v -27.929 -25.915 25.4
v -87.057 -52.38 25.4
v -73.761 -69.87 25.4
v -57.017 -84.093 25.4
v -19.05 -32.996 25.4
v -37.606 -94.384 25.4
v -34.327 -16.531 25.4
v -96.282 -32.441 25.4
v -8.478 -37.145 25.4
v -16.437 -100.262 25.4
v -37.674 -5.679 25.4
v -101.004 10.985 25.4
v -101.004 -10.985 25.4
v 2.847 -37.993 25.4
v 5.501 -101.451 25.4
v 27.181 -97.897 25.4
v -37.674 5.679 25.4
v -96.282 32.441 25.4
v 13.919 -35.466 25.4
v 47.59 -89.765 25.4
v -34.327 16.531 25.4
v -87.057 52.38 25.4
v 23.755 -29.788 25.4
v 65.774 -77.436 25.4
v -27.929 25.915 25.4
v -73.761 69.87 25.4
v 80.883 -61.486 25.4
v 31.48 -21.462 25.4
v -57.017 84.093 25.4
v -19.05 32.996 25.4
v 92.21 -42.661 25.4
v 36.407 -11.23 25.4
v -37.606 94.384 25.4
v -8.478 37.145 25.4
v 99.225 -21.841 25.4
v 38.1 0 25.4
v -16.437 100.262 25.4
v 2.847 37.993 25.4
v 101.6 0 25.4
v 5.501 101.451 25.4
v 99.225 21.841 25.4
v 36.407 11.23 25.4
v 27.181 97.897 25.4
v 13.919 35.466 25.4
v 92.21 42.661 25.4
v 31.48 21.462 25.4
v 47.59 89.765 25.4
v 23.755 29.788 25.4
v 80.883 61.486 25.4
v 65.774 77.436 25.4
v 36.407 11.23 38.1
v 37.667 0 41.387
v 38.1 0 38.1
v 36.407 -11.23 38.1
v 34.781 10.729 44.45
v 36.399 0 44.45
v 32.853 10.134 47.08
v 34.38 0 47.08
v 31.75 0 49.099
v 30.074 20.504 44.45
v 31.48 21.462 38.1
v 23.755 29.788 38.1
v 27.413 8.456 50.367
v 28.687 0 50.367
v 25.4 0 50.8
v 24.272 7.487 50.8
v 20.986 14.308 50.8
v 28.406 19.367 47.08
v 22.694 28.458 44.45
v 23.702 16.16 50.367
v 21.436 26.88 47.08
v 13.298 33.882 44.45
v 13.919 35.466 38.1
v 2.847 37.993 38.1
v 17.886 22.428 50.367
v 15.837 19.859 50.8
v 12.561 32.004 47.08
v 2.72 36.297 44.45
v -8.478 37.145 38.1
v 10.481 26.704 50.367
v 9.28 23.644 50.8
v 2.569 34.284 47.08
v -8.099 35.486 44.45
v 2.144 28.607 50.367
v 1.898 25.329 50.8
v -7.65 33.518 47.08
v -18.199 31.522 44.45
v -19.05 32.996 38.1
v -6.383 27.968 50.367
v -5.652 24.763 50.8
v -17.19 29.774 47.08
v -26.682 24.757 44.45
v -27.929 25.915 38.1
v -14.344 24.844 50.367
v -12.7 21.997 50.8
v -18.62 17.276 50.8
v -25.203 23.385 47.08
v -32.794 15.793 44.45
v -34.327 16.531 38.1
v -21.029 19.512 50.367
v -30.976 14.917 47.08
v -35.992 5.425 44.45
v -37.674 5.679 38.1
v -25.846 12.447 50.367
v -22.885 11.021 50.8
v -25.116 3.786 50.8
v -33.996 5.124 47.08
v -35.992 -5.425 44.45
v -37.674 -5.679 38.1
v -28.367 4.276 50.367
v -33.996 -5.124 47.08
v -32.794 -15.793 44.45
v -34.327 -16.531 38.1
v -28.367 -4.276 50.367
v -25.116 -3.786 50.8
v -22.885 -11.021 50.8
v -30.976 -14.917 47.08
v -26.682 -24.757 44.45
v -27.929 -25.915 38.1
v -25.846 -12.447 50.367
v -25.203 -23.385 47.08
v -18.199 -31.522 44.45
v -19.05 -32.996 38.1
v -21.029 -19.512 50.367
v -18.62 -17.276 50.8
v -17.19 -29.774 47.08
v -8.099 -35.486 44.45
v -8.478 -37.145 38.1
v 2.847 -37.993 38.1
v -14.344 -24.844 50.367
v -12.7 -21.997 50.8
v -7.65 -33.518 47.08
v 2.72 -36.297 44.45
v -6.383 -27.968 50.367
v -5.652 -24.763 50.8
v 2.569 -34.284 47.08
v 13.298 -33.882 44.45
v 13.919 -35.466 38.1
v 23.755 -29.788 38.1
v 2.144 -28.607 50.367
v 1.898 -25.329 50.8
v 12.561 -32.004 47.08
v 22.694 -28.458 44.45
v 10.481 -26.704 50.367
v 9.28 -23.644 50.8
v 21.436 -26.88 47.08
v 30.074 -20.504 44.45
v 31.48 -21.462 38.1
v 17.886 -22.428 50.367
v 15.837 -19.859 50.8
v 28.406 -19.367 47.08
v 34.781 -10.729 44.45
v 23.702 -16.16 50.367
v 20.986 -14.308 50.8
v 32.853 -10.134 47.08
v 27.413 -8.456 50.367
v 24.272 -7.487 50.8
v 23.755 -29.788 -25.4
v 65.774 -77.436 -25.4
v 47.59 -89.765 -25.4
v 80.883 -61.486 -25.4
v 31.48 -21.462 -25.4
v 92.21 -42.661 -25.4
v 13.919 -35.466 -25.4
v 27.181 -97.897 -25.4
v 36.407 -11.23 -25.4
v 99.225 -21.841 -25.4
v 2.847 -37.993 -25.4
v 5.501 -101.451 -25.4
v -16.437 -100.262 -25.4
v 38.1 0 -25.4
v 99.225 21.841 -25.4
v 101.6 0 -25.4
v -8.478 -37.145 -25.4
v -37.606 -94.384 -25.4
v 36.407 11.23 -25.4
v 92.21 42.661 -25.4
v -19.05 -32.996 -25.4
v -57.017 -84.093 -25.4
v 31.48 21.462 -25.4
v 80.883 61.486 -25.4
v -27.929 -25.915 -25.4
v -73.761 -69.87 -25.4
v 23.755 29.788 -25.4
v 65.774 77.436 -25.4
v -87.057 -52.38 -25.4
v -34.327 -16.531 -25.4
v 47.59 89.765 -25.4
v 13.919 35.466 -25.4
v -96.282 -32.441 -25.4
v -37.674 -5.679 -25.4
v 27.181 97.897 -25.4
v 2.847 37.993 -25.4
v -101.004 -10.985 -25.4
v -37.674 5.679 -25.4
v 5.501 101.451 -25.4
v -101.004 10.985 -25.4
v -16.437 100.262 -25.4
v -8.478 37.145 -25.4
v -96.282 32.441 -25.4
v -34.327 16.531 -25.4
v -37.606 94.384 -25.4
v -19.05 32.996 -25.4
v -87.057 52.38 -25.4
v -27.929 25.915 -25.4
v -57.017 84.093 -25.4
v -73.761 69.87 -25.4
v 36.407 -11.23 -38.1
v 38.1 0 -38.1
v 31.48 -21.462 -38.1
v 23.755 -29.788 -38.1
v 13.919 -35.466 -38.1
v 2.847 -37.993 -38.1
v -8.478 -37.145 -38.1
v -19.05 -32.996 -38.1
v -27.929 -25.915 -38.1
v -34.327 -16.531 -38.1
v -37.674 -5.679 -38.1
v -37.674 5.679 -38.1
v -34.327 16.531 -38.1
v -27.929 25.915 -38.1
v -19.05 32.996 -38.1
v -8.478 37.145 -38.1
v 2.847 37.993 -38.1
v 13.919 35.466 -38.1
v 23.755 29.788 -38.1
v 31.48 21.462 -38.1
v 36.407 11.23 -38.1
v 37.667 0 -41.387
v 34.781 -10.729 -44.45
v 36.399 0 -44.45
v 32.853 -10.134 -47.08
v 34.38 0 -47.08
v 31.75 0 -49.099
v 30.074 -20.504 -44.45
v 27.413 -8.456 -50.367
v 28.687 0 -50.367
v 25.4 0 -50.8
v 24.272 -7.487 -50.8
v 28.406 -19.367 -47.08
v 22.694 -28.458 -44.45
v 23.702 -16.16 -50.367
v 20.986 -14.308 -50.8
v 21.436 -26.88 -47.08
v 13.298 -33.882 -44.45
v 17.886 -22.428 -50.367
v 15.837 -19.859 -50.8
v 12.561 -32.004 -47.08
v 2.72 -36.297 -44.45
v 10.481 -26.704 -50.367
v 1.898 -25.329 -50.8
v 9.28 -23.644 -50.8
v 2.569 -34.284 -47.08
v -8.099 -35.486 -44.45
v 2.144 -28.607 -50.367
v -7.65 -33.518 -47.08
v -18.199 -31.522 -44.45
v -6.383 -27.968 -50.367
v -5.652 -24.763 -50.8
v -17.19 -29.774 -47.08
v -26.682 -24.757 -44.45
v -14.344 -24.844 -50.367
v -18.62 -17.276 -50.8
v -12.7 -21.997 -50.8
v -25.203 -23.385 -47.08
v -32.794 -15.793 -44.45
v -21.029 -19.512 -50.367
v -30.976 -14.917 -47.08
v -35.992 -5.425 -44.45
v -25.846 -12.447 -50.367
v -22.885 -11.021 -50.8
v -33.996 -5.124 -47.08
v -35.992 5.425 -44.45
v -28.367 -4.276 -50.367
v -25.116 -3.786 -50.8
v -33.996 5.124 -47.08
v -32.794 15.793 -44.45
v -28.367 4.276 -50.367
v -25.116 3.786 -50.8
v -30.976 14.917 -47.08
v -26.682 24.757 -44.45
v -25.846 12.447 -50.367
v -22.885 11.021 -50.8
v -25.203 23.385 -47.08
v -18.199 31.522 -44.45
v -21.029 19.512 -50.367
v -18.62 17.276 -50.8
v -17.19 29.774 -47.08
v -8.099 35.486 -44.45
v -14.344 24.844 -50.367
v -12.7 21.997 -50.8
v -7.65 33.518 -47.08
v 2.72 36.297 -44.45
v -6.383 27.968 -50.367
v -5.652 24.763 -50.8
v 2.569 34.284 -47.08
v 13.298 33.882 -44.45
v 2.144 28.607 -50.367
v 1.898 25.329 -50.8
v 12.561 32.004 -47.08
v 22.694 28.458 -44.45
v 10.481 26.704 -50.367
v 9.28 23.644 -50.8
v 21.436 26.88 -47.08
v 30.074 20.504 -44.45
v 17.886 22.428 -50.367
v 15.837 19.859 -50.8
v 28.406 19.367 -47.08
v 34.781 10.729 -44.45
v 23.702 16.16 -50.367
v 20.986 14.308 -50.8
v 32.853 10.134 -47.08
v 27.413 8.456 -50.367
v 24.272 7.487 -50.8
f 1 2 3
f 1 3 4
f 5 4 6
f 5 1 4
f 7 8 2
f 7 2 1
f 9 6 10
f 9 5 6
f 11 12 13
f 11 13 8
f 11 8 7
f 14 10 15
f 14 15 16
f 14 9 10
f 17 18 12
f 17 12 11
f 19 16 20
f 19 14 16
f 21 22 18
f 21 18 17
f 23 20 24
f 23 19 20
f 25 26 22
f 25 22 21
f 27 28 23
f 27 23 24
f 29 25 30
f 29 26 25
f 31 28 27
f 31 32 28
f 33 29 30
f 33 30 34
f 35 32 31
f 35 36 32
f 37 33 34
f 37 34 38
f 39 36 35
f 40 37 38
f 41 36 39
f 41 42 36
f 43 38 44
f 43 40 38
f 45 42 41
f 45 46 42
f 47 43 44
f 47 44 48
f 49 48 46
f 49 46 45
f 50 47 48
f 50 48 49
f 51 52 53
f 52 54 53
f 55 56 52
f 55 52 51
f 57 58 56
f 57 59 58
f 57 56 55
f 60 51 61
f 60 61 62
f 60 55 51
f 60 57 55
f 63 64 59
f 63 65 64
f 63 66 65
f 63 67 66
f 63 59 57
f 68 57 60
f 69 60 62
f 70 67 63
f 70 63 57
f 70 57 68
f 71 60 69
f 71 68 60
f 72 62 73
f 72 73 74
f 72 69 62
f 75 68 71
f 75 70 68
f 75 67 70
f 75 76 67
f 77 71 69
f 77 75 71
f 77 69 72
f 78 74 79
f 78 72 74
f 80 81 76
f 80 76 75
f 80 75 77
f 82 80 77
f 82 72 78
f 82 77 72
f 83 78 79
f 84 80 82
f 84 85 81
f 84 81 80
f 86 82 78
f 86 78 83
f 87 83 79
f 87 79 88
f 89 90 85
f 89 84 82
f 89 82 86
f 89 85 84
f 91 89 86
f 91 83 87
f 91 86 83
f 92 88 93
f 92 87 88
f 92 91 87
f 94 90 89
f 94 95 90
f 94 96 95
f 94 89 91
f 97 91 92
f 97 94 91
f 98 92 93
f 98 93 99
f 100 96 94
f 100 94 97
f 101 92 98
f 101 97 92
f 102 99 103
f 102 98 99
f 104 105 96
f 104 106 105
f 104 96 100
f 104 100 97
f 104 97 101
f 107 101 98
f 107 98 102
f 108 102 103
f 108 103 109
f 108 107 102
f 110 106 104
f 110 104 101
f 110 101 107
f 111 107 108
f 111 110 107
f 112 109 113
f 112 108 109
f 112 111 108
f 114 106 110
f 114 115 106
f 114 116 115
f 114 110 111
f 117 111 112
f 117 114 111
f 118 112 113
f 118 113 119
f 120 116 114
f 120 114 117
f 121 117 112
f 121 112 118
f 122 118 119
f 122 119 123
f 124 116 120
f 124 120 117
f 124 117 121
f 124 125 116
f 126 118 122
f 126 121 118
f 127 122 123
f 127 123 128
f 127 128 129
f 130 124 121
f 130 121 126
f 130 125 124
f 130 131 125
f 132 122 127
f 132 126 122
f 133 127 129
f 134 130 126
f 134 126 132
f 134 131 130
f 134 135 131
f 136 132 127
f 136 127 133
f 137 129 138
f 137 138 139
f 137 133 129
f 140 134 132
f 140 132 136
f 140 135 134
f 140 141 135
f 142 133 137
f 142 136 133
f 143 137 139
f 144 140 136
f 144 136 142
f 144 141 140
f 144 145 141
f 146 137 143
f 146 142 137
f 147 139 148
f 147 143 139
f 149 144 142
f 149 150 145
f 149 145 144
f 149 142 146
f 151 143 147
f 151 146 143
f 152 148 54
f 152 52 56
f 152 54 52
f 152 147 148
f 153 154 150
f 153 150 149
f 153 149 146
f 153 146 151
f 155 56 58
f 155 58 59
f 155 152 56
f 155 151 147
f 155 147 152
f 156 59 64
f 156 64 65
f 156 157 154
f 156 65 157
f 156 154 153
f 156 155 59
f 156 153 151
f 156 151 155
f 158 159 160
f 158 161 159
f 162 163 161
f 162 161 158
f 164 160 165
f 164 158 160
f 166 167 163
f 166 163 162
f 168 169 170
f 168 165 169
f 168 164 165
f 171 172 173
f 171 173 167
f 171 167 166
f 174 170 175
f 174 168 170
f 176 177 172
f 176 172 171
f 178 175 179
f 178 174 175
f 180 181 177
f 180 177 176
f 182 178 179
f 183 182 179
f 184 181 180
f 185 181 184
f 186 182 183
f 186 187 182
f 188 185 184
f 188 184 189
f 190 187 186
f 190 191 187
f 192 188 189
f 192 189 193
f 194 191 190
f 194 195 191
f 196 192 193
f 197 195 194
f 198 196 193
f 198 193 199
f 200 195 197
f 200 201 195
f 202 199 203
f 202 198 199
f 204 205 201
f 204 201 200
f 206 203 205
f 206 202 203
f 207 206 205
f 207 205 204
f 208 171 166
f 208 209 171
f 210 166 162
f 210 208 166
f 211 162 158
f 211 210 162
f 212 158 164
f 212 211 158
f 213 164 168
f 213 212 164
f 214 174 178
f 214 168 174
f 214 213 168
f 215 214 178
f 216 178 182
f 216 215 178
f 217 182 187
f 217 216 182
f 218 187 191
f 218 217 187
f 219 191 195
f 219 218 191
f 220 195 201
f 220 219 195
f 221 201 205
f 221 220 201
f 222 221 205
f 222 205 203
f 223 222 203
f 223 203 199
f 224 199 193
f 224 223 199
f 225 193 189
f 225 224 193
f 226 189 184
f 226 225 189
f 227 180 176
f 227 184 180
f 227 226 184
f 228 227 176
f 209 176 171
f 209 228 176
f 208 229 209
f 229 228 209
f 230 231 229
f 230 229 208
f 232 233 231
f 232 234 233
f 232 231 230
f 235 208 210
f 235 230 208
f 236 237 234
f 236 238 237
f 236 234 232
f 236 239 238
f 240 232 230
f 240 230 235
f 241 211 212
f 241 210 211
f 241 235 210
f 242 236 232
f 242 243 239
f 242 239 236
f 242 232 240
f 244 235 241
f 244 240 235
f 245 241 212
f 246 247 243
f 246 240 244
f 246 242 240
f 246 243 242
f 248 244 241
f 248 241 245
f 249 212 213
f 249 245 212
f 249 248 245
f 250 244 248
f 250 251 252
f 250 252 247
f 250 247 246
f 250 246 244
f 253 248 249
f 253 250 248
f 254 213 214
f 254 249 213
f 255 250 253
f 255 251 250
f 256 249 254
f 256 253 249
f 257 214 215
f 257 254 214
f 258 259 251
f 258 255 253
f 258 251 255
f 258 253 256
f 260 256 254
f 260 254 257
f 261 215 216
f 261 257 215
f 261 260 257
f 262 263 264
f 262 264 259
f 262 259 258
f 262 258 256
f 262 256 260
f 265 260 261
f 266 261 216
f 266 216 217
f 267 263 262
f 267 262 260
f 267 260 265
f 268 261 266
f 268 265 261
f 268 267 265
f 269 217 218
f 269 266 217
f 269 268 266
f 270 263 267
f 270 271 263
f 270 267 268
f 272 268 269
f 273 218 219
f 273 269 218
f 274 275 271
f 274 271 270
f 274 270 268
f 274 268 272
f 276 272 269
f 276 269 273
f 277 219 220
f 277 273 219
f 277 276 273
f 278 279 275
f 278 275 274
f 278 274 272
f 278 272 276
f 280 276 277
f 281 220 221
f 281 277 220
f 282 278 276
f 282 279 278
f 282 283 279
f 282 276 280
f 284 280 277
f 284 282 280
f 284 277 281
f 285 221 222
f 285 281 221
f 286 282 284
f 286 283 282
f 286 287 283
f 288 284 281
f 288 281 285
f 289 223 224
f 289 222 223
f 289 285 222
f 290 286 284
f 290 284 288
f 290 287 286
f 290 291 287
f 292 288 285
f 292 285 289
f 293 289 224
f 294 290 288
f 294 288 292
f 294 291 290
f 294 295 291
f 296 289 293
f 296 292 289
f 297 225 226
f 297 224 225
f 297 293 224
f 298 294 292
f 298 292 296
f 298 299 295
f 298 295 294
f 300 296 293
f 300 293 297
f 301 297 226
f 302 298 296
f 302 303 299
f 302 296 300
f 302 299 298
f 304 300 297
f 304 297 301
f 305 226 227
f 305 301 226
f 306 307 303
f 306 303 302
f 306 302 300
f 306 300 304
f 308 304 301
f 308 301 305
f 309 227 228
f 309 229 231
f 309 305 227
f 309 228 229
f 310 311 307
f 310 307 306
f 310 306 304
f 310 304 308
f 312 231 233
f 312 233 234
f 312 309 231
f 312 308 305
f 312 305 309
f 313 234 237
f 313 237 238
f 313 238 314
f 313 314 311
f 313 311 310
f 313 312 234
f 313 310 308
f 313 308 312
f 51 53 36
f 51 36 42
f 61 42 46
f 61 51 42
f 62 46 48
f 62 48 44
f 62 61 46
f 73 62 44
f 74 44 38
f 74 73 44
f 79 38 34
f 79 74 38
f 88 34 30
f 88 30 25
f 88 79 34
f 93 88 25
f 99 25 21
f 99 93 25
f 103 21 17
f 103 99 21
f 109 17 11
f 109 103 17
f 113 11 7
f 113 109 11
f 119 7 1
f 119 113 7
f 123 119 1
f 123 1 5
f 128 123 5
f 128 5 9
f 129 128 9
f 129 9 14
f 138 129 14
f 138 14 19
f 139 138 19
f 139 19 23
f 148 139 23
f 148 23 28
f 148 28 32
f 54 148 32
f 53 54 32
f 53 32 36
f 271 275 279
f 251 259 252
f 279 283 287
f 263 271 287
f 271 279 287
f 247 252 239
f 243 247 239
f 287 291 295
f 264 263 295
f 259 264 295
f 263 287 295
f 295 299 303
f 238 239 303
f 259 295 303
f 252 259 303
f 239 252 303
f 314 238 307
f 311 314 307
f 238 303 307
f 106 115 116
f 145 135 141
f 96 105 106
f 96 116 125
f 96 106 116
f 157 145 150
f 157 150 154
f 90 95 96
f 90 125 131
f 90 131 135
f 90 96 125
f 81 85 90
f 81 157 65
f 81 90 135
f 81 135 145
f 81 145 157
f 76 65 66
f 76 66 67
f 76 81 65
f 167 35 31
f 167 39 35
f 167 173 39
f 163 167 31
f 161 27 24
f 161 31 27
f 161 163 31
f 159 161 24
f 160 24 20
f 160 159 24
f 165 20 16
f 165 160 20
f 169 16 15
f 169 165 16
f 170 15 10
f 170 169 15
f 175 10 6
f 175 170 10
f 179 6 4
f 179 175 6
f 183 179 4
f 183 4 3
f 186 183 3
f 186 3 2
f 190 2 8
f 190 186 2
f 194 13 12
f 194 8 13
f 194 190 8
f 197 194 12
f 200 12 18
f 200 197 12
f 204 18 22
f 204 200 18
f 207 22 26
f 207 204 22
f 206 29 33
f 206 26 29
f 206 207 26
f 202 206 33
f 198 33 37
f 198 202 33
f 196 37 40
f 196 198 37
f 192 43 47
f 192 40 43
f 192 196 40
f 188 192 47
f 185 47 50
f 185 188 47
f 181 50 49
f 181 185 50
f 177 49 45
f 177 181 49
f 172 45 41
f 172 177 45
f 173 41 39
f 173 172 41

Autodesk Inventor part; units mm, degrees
ref_plane "YZ Plane" through (0, 0, 0) normal (1, 0, 0) x (0, 1, 0)
ref_plane "XZ Plane" through (0, 0, 0) normal (0, 1, 0) x (-1, 0, 0)
ref_plane "XY Plane" through (0, 0, 0) normal (0, 0, 1) x (1, 0, 0)
sketch "Sketch1" plane through (0, 0, 0) normal (0, 0, 1) x (1, 0, 0)
  circle A0 centre (0, 0) radius 101.6
  dimension "d0" = 203.2
extrude "Extrusion1" add sketch "Sketch1" along normal mid plane 101.6
sketch "Sketch2" plane through (0, 0, 50.8) normal (0, 0, 1) x (1, 0, 0)
  circle A0 centre (0, 0) radius 101.6 projected
  circle A1 centre (0, 0) radius 101.6
  circle A2 centre (0, 0) radius 38.1
  dimension "d4" = 76.2
extrude "Extrusion2" cut sketch "Sketch2" against normal blind 25.4
mirror "Mirror1" about plane through (0, 0, 0) normal (0, 0, 1) of "Extrusion2"
fillet "Fillet1" radius 12.7 2 edges at (-38.1, 0, 50.8) (-38.1, 0, -50.8)
properties part number "wheel"
